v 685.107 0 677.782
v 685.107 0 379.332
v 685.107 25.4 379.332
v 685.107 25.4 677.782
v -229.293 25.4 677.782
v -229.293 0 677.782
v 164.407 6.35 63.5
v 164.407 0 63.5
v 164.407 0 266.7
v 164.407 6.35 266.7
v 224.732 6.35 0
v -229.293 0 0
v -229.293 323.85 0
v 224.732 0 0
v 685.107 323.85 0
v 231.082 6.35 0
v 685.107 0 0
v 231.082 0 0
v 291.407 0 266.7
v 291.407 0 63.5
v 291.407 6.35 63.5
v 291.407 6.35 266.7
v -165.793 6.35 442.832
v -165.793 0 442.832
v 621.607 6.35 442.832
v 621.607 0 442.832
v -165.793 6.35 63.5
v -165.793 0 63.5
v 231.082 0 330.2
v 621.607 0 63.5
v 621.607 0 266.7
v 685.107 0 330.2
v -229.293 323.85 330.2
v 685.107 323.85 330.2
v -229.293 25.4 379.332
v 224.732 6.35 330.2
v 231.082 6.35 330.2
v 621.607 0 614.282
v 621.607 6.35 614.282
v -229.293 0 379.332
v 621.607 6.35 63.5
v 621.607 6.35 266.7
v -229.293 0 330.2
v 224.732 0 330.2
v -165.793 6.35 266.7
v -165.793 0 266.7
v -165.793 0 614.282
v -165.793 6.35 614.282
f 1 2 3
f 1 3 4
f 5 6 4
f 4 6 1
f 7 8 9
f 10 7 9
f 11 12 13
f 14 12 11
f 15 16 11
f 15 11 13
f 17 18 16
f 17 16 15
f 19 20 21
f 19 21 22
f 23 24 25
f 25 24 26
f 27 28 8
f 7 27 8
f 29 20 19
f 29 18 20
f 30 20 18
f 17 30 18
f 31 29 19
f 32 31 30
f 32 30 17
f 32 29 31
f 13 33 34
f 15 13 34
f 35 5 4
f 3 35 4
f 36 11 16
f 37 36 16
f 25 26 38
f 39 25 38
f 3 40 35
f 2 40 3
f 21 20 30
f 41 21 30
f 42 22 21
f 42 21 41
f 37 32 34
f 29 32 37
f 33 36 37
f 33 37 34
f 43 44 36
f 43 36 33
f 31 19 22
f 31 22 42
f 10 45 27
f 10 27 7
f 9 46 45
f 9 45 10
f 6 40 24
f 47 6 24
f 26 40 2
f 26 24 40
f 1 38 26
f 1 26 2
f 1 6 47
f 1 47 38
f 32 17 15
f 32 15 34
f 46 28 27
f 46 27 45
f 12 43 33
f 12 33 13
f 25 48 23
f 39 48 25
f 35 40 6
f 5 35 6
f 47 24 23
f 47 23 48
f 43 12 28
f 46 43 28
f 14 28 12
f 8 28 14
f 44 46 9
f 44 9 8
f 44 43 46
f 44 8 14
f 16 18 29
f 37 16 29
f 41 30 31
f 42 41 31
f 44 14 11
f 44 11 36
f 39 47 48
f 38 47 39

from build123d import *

# Parameters (mm, degrees)
F0_W     = 330.2
F0_H     = 203.2
F0_W_2   = 3.175
F0_H_2   = 330.2
F1_DEPTH = 323.85
F2_DEPTH = 6.35
F0_W_3   = 914.4
F0_H_3   = 298.45
F0_W_4   = 787.4
F0_H_4   = 171.45
F3_DEPTH = 25.4
F4_DEPTH = 6.35


# Not quite as in the source:
# - a feature names something its author has since deleted; it is built from what else it names


with BuildPart() as f1:
    # F0 (on Front) → F1 (new body)
    with BuildSketch(Plane.XZ):
        Polygon((-229.2927574873, 0), (224.7322425127, 0), (224.7322425127, 330.2), (100.9072425127, 330.2), (-229.2927574873, 330.2), align=None)
        with Locations((-0.6927574873, 165.1)):
            Rectangle(F0_W, F0_H, mode=Mode.SUBTRACT)
        Polygon((231.0822425127, 330.2), (231.0822425127, 0), (685.1072425127, 0), (685.1072425127, 330.2), (354.9072425127, 330.2), align=None)
        with Locations((456.5072425127, 165.1)):
            Rectangle(F0_W, F0_H, mode=Mode.SUBTRACT)
        with Locations((-0.6927574873, 165.1)):
            Rectangle(F0_W, F0_H)
        with Locations((456.5072425127, 165.1)):
            Rectangle(F0_W, F0_H)
        with Locations((226.3197425127, 165.1)):
            Rectangle(F0_W_2, F0_H_2)
        with Locations((229.4947425127, 165.1)):
            Rectangle(F0_W_2, F0_H_2)
    extrude(amount=-F1_DEPTH)

    # F0 (on Front) → F2 (cut)
    with BuildSketch(Plane.XZ):
        with Locations((226.3197425127, 165.1)):
            Rectangle(F0_W_2, F0_H_2)
        with Locations((229.4947425127, 165.1)):
            Rectangle(F0_W_2, F0_H_2)
        with Locations((-0.6927574873, 165.1)):
            Rectangle(F0_W, F0_H)
        with Locations((456.5072425127, 165.1)):
            Rectangle(F0_W, F0_H)
    extrude(amount=-F2_DEPTH, mode=Mode.SUBTRACT)


with BuildPart() as f3:
    # F0 (on Front) → F3 (new body)
    with BuildSketch(Plane.XZ):
        with Locations((227.9072425127, 528.5571549892)):
            Rectangle(F0_W_3, F0_H_3)
        with Locations((227.9072425127, 528.5571549892)):
            Rectangle(F0_W_4, F0_H_4, mode=Mode.SUBTRACT)
        with Locations((227.9072425127, 528.5571549892)):
            Rectangle(F0_W_4, F0_H_4)
    extrude(amount=-F3_DEPTH)

    # F0 (on Front) → F4 (cut)
    with BuildSketch(Plane.XZ):
        with Locations((227.9072425127, 528.5571549892)):
            Rectangle(F0_W_4, F0_H_4)
    extrude(amount=-F4_DEPTH, mode=Mode.SUBTRACT)


solid = Compound([f1.part, f3.part])
